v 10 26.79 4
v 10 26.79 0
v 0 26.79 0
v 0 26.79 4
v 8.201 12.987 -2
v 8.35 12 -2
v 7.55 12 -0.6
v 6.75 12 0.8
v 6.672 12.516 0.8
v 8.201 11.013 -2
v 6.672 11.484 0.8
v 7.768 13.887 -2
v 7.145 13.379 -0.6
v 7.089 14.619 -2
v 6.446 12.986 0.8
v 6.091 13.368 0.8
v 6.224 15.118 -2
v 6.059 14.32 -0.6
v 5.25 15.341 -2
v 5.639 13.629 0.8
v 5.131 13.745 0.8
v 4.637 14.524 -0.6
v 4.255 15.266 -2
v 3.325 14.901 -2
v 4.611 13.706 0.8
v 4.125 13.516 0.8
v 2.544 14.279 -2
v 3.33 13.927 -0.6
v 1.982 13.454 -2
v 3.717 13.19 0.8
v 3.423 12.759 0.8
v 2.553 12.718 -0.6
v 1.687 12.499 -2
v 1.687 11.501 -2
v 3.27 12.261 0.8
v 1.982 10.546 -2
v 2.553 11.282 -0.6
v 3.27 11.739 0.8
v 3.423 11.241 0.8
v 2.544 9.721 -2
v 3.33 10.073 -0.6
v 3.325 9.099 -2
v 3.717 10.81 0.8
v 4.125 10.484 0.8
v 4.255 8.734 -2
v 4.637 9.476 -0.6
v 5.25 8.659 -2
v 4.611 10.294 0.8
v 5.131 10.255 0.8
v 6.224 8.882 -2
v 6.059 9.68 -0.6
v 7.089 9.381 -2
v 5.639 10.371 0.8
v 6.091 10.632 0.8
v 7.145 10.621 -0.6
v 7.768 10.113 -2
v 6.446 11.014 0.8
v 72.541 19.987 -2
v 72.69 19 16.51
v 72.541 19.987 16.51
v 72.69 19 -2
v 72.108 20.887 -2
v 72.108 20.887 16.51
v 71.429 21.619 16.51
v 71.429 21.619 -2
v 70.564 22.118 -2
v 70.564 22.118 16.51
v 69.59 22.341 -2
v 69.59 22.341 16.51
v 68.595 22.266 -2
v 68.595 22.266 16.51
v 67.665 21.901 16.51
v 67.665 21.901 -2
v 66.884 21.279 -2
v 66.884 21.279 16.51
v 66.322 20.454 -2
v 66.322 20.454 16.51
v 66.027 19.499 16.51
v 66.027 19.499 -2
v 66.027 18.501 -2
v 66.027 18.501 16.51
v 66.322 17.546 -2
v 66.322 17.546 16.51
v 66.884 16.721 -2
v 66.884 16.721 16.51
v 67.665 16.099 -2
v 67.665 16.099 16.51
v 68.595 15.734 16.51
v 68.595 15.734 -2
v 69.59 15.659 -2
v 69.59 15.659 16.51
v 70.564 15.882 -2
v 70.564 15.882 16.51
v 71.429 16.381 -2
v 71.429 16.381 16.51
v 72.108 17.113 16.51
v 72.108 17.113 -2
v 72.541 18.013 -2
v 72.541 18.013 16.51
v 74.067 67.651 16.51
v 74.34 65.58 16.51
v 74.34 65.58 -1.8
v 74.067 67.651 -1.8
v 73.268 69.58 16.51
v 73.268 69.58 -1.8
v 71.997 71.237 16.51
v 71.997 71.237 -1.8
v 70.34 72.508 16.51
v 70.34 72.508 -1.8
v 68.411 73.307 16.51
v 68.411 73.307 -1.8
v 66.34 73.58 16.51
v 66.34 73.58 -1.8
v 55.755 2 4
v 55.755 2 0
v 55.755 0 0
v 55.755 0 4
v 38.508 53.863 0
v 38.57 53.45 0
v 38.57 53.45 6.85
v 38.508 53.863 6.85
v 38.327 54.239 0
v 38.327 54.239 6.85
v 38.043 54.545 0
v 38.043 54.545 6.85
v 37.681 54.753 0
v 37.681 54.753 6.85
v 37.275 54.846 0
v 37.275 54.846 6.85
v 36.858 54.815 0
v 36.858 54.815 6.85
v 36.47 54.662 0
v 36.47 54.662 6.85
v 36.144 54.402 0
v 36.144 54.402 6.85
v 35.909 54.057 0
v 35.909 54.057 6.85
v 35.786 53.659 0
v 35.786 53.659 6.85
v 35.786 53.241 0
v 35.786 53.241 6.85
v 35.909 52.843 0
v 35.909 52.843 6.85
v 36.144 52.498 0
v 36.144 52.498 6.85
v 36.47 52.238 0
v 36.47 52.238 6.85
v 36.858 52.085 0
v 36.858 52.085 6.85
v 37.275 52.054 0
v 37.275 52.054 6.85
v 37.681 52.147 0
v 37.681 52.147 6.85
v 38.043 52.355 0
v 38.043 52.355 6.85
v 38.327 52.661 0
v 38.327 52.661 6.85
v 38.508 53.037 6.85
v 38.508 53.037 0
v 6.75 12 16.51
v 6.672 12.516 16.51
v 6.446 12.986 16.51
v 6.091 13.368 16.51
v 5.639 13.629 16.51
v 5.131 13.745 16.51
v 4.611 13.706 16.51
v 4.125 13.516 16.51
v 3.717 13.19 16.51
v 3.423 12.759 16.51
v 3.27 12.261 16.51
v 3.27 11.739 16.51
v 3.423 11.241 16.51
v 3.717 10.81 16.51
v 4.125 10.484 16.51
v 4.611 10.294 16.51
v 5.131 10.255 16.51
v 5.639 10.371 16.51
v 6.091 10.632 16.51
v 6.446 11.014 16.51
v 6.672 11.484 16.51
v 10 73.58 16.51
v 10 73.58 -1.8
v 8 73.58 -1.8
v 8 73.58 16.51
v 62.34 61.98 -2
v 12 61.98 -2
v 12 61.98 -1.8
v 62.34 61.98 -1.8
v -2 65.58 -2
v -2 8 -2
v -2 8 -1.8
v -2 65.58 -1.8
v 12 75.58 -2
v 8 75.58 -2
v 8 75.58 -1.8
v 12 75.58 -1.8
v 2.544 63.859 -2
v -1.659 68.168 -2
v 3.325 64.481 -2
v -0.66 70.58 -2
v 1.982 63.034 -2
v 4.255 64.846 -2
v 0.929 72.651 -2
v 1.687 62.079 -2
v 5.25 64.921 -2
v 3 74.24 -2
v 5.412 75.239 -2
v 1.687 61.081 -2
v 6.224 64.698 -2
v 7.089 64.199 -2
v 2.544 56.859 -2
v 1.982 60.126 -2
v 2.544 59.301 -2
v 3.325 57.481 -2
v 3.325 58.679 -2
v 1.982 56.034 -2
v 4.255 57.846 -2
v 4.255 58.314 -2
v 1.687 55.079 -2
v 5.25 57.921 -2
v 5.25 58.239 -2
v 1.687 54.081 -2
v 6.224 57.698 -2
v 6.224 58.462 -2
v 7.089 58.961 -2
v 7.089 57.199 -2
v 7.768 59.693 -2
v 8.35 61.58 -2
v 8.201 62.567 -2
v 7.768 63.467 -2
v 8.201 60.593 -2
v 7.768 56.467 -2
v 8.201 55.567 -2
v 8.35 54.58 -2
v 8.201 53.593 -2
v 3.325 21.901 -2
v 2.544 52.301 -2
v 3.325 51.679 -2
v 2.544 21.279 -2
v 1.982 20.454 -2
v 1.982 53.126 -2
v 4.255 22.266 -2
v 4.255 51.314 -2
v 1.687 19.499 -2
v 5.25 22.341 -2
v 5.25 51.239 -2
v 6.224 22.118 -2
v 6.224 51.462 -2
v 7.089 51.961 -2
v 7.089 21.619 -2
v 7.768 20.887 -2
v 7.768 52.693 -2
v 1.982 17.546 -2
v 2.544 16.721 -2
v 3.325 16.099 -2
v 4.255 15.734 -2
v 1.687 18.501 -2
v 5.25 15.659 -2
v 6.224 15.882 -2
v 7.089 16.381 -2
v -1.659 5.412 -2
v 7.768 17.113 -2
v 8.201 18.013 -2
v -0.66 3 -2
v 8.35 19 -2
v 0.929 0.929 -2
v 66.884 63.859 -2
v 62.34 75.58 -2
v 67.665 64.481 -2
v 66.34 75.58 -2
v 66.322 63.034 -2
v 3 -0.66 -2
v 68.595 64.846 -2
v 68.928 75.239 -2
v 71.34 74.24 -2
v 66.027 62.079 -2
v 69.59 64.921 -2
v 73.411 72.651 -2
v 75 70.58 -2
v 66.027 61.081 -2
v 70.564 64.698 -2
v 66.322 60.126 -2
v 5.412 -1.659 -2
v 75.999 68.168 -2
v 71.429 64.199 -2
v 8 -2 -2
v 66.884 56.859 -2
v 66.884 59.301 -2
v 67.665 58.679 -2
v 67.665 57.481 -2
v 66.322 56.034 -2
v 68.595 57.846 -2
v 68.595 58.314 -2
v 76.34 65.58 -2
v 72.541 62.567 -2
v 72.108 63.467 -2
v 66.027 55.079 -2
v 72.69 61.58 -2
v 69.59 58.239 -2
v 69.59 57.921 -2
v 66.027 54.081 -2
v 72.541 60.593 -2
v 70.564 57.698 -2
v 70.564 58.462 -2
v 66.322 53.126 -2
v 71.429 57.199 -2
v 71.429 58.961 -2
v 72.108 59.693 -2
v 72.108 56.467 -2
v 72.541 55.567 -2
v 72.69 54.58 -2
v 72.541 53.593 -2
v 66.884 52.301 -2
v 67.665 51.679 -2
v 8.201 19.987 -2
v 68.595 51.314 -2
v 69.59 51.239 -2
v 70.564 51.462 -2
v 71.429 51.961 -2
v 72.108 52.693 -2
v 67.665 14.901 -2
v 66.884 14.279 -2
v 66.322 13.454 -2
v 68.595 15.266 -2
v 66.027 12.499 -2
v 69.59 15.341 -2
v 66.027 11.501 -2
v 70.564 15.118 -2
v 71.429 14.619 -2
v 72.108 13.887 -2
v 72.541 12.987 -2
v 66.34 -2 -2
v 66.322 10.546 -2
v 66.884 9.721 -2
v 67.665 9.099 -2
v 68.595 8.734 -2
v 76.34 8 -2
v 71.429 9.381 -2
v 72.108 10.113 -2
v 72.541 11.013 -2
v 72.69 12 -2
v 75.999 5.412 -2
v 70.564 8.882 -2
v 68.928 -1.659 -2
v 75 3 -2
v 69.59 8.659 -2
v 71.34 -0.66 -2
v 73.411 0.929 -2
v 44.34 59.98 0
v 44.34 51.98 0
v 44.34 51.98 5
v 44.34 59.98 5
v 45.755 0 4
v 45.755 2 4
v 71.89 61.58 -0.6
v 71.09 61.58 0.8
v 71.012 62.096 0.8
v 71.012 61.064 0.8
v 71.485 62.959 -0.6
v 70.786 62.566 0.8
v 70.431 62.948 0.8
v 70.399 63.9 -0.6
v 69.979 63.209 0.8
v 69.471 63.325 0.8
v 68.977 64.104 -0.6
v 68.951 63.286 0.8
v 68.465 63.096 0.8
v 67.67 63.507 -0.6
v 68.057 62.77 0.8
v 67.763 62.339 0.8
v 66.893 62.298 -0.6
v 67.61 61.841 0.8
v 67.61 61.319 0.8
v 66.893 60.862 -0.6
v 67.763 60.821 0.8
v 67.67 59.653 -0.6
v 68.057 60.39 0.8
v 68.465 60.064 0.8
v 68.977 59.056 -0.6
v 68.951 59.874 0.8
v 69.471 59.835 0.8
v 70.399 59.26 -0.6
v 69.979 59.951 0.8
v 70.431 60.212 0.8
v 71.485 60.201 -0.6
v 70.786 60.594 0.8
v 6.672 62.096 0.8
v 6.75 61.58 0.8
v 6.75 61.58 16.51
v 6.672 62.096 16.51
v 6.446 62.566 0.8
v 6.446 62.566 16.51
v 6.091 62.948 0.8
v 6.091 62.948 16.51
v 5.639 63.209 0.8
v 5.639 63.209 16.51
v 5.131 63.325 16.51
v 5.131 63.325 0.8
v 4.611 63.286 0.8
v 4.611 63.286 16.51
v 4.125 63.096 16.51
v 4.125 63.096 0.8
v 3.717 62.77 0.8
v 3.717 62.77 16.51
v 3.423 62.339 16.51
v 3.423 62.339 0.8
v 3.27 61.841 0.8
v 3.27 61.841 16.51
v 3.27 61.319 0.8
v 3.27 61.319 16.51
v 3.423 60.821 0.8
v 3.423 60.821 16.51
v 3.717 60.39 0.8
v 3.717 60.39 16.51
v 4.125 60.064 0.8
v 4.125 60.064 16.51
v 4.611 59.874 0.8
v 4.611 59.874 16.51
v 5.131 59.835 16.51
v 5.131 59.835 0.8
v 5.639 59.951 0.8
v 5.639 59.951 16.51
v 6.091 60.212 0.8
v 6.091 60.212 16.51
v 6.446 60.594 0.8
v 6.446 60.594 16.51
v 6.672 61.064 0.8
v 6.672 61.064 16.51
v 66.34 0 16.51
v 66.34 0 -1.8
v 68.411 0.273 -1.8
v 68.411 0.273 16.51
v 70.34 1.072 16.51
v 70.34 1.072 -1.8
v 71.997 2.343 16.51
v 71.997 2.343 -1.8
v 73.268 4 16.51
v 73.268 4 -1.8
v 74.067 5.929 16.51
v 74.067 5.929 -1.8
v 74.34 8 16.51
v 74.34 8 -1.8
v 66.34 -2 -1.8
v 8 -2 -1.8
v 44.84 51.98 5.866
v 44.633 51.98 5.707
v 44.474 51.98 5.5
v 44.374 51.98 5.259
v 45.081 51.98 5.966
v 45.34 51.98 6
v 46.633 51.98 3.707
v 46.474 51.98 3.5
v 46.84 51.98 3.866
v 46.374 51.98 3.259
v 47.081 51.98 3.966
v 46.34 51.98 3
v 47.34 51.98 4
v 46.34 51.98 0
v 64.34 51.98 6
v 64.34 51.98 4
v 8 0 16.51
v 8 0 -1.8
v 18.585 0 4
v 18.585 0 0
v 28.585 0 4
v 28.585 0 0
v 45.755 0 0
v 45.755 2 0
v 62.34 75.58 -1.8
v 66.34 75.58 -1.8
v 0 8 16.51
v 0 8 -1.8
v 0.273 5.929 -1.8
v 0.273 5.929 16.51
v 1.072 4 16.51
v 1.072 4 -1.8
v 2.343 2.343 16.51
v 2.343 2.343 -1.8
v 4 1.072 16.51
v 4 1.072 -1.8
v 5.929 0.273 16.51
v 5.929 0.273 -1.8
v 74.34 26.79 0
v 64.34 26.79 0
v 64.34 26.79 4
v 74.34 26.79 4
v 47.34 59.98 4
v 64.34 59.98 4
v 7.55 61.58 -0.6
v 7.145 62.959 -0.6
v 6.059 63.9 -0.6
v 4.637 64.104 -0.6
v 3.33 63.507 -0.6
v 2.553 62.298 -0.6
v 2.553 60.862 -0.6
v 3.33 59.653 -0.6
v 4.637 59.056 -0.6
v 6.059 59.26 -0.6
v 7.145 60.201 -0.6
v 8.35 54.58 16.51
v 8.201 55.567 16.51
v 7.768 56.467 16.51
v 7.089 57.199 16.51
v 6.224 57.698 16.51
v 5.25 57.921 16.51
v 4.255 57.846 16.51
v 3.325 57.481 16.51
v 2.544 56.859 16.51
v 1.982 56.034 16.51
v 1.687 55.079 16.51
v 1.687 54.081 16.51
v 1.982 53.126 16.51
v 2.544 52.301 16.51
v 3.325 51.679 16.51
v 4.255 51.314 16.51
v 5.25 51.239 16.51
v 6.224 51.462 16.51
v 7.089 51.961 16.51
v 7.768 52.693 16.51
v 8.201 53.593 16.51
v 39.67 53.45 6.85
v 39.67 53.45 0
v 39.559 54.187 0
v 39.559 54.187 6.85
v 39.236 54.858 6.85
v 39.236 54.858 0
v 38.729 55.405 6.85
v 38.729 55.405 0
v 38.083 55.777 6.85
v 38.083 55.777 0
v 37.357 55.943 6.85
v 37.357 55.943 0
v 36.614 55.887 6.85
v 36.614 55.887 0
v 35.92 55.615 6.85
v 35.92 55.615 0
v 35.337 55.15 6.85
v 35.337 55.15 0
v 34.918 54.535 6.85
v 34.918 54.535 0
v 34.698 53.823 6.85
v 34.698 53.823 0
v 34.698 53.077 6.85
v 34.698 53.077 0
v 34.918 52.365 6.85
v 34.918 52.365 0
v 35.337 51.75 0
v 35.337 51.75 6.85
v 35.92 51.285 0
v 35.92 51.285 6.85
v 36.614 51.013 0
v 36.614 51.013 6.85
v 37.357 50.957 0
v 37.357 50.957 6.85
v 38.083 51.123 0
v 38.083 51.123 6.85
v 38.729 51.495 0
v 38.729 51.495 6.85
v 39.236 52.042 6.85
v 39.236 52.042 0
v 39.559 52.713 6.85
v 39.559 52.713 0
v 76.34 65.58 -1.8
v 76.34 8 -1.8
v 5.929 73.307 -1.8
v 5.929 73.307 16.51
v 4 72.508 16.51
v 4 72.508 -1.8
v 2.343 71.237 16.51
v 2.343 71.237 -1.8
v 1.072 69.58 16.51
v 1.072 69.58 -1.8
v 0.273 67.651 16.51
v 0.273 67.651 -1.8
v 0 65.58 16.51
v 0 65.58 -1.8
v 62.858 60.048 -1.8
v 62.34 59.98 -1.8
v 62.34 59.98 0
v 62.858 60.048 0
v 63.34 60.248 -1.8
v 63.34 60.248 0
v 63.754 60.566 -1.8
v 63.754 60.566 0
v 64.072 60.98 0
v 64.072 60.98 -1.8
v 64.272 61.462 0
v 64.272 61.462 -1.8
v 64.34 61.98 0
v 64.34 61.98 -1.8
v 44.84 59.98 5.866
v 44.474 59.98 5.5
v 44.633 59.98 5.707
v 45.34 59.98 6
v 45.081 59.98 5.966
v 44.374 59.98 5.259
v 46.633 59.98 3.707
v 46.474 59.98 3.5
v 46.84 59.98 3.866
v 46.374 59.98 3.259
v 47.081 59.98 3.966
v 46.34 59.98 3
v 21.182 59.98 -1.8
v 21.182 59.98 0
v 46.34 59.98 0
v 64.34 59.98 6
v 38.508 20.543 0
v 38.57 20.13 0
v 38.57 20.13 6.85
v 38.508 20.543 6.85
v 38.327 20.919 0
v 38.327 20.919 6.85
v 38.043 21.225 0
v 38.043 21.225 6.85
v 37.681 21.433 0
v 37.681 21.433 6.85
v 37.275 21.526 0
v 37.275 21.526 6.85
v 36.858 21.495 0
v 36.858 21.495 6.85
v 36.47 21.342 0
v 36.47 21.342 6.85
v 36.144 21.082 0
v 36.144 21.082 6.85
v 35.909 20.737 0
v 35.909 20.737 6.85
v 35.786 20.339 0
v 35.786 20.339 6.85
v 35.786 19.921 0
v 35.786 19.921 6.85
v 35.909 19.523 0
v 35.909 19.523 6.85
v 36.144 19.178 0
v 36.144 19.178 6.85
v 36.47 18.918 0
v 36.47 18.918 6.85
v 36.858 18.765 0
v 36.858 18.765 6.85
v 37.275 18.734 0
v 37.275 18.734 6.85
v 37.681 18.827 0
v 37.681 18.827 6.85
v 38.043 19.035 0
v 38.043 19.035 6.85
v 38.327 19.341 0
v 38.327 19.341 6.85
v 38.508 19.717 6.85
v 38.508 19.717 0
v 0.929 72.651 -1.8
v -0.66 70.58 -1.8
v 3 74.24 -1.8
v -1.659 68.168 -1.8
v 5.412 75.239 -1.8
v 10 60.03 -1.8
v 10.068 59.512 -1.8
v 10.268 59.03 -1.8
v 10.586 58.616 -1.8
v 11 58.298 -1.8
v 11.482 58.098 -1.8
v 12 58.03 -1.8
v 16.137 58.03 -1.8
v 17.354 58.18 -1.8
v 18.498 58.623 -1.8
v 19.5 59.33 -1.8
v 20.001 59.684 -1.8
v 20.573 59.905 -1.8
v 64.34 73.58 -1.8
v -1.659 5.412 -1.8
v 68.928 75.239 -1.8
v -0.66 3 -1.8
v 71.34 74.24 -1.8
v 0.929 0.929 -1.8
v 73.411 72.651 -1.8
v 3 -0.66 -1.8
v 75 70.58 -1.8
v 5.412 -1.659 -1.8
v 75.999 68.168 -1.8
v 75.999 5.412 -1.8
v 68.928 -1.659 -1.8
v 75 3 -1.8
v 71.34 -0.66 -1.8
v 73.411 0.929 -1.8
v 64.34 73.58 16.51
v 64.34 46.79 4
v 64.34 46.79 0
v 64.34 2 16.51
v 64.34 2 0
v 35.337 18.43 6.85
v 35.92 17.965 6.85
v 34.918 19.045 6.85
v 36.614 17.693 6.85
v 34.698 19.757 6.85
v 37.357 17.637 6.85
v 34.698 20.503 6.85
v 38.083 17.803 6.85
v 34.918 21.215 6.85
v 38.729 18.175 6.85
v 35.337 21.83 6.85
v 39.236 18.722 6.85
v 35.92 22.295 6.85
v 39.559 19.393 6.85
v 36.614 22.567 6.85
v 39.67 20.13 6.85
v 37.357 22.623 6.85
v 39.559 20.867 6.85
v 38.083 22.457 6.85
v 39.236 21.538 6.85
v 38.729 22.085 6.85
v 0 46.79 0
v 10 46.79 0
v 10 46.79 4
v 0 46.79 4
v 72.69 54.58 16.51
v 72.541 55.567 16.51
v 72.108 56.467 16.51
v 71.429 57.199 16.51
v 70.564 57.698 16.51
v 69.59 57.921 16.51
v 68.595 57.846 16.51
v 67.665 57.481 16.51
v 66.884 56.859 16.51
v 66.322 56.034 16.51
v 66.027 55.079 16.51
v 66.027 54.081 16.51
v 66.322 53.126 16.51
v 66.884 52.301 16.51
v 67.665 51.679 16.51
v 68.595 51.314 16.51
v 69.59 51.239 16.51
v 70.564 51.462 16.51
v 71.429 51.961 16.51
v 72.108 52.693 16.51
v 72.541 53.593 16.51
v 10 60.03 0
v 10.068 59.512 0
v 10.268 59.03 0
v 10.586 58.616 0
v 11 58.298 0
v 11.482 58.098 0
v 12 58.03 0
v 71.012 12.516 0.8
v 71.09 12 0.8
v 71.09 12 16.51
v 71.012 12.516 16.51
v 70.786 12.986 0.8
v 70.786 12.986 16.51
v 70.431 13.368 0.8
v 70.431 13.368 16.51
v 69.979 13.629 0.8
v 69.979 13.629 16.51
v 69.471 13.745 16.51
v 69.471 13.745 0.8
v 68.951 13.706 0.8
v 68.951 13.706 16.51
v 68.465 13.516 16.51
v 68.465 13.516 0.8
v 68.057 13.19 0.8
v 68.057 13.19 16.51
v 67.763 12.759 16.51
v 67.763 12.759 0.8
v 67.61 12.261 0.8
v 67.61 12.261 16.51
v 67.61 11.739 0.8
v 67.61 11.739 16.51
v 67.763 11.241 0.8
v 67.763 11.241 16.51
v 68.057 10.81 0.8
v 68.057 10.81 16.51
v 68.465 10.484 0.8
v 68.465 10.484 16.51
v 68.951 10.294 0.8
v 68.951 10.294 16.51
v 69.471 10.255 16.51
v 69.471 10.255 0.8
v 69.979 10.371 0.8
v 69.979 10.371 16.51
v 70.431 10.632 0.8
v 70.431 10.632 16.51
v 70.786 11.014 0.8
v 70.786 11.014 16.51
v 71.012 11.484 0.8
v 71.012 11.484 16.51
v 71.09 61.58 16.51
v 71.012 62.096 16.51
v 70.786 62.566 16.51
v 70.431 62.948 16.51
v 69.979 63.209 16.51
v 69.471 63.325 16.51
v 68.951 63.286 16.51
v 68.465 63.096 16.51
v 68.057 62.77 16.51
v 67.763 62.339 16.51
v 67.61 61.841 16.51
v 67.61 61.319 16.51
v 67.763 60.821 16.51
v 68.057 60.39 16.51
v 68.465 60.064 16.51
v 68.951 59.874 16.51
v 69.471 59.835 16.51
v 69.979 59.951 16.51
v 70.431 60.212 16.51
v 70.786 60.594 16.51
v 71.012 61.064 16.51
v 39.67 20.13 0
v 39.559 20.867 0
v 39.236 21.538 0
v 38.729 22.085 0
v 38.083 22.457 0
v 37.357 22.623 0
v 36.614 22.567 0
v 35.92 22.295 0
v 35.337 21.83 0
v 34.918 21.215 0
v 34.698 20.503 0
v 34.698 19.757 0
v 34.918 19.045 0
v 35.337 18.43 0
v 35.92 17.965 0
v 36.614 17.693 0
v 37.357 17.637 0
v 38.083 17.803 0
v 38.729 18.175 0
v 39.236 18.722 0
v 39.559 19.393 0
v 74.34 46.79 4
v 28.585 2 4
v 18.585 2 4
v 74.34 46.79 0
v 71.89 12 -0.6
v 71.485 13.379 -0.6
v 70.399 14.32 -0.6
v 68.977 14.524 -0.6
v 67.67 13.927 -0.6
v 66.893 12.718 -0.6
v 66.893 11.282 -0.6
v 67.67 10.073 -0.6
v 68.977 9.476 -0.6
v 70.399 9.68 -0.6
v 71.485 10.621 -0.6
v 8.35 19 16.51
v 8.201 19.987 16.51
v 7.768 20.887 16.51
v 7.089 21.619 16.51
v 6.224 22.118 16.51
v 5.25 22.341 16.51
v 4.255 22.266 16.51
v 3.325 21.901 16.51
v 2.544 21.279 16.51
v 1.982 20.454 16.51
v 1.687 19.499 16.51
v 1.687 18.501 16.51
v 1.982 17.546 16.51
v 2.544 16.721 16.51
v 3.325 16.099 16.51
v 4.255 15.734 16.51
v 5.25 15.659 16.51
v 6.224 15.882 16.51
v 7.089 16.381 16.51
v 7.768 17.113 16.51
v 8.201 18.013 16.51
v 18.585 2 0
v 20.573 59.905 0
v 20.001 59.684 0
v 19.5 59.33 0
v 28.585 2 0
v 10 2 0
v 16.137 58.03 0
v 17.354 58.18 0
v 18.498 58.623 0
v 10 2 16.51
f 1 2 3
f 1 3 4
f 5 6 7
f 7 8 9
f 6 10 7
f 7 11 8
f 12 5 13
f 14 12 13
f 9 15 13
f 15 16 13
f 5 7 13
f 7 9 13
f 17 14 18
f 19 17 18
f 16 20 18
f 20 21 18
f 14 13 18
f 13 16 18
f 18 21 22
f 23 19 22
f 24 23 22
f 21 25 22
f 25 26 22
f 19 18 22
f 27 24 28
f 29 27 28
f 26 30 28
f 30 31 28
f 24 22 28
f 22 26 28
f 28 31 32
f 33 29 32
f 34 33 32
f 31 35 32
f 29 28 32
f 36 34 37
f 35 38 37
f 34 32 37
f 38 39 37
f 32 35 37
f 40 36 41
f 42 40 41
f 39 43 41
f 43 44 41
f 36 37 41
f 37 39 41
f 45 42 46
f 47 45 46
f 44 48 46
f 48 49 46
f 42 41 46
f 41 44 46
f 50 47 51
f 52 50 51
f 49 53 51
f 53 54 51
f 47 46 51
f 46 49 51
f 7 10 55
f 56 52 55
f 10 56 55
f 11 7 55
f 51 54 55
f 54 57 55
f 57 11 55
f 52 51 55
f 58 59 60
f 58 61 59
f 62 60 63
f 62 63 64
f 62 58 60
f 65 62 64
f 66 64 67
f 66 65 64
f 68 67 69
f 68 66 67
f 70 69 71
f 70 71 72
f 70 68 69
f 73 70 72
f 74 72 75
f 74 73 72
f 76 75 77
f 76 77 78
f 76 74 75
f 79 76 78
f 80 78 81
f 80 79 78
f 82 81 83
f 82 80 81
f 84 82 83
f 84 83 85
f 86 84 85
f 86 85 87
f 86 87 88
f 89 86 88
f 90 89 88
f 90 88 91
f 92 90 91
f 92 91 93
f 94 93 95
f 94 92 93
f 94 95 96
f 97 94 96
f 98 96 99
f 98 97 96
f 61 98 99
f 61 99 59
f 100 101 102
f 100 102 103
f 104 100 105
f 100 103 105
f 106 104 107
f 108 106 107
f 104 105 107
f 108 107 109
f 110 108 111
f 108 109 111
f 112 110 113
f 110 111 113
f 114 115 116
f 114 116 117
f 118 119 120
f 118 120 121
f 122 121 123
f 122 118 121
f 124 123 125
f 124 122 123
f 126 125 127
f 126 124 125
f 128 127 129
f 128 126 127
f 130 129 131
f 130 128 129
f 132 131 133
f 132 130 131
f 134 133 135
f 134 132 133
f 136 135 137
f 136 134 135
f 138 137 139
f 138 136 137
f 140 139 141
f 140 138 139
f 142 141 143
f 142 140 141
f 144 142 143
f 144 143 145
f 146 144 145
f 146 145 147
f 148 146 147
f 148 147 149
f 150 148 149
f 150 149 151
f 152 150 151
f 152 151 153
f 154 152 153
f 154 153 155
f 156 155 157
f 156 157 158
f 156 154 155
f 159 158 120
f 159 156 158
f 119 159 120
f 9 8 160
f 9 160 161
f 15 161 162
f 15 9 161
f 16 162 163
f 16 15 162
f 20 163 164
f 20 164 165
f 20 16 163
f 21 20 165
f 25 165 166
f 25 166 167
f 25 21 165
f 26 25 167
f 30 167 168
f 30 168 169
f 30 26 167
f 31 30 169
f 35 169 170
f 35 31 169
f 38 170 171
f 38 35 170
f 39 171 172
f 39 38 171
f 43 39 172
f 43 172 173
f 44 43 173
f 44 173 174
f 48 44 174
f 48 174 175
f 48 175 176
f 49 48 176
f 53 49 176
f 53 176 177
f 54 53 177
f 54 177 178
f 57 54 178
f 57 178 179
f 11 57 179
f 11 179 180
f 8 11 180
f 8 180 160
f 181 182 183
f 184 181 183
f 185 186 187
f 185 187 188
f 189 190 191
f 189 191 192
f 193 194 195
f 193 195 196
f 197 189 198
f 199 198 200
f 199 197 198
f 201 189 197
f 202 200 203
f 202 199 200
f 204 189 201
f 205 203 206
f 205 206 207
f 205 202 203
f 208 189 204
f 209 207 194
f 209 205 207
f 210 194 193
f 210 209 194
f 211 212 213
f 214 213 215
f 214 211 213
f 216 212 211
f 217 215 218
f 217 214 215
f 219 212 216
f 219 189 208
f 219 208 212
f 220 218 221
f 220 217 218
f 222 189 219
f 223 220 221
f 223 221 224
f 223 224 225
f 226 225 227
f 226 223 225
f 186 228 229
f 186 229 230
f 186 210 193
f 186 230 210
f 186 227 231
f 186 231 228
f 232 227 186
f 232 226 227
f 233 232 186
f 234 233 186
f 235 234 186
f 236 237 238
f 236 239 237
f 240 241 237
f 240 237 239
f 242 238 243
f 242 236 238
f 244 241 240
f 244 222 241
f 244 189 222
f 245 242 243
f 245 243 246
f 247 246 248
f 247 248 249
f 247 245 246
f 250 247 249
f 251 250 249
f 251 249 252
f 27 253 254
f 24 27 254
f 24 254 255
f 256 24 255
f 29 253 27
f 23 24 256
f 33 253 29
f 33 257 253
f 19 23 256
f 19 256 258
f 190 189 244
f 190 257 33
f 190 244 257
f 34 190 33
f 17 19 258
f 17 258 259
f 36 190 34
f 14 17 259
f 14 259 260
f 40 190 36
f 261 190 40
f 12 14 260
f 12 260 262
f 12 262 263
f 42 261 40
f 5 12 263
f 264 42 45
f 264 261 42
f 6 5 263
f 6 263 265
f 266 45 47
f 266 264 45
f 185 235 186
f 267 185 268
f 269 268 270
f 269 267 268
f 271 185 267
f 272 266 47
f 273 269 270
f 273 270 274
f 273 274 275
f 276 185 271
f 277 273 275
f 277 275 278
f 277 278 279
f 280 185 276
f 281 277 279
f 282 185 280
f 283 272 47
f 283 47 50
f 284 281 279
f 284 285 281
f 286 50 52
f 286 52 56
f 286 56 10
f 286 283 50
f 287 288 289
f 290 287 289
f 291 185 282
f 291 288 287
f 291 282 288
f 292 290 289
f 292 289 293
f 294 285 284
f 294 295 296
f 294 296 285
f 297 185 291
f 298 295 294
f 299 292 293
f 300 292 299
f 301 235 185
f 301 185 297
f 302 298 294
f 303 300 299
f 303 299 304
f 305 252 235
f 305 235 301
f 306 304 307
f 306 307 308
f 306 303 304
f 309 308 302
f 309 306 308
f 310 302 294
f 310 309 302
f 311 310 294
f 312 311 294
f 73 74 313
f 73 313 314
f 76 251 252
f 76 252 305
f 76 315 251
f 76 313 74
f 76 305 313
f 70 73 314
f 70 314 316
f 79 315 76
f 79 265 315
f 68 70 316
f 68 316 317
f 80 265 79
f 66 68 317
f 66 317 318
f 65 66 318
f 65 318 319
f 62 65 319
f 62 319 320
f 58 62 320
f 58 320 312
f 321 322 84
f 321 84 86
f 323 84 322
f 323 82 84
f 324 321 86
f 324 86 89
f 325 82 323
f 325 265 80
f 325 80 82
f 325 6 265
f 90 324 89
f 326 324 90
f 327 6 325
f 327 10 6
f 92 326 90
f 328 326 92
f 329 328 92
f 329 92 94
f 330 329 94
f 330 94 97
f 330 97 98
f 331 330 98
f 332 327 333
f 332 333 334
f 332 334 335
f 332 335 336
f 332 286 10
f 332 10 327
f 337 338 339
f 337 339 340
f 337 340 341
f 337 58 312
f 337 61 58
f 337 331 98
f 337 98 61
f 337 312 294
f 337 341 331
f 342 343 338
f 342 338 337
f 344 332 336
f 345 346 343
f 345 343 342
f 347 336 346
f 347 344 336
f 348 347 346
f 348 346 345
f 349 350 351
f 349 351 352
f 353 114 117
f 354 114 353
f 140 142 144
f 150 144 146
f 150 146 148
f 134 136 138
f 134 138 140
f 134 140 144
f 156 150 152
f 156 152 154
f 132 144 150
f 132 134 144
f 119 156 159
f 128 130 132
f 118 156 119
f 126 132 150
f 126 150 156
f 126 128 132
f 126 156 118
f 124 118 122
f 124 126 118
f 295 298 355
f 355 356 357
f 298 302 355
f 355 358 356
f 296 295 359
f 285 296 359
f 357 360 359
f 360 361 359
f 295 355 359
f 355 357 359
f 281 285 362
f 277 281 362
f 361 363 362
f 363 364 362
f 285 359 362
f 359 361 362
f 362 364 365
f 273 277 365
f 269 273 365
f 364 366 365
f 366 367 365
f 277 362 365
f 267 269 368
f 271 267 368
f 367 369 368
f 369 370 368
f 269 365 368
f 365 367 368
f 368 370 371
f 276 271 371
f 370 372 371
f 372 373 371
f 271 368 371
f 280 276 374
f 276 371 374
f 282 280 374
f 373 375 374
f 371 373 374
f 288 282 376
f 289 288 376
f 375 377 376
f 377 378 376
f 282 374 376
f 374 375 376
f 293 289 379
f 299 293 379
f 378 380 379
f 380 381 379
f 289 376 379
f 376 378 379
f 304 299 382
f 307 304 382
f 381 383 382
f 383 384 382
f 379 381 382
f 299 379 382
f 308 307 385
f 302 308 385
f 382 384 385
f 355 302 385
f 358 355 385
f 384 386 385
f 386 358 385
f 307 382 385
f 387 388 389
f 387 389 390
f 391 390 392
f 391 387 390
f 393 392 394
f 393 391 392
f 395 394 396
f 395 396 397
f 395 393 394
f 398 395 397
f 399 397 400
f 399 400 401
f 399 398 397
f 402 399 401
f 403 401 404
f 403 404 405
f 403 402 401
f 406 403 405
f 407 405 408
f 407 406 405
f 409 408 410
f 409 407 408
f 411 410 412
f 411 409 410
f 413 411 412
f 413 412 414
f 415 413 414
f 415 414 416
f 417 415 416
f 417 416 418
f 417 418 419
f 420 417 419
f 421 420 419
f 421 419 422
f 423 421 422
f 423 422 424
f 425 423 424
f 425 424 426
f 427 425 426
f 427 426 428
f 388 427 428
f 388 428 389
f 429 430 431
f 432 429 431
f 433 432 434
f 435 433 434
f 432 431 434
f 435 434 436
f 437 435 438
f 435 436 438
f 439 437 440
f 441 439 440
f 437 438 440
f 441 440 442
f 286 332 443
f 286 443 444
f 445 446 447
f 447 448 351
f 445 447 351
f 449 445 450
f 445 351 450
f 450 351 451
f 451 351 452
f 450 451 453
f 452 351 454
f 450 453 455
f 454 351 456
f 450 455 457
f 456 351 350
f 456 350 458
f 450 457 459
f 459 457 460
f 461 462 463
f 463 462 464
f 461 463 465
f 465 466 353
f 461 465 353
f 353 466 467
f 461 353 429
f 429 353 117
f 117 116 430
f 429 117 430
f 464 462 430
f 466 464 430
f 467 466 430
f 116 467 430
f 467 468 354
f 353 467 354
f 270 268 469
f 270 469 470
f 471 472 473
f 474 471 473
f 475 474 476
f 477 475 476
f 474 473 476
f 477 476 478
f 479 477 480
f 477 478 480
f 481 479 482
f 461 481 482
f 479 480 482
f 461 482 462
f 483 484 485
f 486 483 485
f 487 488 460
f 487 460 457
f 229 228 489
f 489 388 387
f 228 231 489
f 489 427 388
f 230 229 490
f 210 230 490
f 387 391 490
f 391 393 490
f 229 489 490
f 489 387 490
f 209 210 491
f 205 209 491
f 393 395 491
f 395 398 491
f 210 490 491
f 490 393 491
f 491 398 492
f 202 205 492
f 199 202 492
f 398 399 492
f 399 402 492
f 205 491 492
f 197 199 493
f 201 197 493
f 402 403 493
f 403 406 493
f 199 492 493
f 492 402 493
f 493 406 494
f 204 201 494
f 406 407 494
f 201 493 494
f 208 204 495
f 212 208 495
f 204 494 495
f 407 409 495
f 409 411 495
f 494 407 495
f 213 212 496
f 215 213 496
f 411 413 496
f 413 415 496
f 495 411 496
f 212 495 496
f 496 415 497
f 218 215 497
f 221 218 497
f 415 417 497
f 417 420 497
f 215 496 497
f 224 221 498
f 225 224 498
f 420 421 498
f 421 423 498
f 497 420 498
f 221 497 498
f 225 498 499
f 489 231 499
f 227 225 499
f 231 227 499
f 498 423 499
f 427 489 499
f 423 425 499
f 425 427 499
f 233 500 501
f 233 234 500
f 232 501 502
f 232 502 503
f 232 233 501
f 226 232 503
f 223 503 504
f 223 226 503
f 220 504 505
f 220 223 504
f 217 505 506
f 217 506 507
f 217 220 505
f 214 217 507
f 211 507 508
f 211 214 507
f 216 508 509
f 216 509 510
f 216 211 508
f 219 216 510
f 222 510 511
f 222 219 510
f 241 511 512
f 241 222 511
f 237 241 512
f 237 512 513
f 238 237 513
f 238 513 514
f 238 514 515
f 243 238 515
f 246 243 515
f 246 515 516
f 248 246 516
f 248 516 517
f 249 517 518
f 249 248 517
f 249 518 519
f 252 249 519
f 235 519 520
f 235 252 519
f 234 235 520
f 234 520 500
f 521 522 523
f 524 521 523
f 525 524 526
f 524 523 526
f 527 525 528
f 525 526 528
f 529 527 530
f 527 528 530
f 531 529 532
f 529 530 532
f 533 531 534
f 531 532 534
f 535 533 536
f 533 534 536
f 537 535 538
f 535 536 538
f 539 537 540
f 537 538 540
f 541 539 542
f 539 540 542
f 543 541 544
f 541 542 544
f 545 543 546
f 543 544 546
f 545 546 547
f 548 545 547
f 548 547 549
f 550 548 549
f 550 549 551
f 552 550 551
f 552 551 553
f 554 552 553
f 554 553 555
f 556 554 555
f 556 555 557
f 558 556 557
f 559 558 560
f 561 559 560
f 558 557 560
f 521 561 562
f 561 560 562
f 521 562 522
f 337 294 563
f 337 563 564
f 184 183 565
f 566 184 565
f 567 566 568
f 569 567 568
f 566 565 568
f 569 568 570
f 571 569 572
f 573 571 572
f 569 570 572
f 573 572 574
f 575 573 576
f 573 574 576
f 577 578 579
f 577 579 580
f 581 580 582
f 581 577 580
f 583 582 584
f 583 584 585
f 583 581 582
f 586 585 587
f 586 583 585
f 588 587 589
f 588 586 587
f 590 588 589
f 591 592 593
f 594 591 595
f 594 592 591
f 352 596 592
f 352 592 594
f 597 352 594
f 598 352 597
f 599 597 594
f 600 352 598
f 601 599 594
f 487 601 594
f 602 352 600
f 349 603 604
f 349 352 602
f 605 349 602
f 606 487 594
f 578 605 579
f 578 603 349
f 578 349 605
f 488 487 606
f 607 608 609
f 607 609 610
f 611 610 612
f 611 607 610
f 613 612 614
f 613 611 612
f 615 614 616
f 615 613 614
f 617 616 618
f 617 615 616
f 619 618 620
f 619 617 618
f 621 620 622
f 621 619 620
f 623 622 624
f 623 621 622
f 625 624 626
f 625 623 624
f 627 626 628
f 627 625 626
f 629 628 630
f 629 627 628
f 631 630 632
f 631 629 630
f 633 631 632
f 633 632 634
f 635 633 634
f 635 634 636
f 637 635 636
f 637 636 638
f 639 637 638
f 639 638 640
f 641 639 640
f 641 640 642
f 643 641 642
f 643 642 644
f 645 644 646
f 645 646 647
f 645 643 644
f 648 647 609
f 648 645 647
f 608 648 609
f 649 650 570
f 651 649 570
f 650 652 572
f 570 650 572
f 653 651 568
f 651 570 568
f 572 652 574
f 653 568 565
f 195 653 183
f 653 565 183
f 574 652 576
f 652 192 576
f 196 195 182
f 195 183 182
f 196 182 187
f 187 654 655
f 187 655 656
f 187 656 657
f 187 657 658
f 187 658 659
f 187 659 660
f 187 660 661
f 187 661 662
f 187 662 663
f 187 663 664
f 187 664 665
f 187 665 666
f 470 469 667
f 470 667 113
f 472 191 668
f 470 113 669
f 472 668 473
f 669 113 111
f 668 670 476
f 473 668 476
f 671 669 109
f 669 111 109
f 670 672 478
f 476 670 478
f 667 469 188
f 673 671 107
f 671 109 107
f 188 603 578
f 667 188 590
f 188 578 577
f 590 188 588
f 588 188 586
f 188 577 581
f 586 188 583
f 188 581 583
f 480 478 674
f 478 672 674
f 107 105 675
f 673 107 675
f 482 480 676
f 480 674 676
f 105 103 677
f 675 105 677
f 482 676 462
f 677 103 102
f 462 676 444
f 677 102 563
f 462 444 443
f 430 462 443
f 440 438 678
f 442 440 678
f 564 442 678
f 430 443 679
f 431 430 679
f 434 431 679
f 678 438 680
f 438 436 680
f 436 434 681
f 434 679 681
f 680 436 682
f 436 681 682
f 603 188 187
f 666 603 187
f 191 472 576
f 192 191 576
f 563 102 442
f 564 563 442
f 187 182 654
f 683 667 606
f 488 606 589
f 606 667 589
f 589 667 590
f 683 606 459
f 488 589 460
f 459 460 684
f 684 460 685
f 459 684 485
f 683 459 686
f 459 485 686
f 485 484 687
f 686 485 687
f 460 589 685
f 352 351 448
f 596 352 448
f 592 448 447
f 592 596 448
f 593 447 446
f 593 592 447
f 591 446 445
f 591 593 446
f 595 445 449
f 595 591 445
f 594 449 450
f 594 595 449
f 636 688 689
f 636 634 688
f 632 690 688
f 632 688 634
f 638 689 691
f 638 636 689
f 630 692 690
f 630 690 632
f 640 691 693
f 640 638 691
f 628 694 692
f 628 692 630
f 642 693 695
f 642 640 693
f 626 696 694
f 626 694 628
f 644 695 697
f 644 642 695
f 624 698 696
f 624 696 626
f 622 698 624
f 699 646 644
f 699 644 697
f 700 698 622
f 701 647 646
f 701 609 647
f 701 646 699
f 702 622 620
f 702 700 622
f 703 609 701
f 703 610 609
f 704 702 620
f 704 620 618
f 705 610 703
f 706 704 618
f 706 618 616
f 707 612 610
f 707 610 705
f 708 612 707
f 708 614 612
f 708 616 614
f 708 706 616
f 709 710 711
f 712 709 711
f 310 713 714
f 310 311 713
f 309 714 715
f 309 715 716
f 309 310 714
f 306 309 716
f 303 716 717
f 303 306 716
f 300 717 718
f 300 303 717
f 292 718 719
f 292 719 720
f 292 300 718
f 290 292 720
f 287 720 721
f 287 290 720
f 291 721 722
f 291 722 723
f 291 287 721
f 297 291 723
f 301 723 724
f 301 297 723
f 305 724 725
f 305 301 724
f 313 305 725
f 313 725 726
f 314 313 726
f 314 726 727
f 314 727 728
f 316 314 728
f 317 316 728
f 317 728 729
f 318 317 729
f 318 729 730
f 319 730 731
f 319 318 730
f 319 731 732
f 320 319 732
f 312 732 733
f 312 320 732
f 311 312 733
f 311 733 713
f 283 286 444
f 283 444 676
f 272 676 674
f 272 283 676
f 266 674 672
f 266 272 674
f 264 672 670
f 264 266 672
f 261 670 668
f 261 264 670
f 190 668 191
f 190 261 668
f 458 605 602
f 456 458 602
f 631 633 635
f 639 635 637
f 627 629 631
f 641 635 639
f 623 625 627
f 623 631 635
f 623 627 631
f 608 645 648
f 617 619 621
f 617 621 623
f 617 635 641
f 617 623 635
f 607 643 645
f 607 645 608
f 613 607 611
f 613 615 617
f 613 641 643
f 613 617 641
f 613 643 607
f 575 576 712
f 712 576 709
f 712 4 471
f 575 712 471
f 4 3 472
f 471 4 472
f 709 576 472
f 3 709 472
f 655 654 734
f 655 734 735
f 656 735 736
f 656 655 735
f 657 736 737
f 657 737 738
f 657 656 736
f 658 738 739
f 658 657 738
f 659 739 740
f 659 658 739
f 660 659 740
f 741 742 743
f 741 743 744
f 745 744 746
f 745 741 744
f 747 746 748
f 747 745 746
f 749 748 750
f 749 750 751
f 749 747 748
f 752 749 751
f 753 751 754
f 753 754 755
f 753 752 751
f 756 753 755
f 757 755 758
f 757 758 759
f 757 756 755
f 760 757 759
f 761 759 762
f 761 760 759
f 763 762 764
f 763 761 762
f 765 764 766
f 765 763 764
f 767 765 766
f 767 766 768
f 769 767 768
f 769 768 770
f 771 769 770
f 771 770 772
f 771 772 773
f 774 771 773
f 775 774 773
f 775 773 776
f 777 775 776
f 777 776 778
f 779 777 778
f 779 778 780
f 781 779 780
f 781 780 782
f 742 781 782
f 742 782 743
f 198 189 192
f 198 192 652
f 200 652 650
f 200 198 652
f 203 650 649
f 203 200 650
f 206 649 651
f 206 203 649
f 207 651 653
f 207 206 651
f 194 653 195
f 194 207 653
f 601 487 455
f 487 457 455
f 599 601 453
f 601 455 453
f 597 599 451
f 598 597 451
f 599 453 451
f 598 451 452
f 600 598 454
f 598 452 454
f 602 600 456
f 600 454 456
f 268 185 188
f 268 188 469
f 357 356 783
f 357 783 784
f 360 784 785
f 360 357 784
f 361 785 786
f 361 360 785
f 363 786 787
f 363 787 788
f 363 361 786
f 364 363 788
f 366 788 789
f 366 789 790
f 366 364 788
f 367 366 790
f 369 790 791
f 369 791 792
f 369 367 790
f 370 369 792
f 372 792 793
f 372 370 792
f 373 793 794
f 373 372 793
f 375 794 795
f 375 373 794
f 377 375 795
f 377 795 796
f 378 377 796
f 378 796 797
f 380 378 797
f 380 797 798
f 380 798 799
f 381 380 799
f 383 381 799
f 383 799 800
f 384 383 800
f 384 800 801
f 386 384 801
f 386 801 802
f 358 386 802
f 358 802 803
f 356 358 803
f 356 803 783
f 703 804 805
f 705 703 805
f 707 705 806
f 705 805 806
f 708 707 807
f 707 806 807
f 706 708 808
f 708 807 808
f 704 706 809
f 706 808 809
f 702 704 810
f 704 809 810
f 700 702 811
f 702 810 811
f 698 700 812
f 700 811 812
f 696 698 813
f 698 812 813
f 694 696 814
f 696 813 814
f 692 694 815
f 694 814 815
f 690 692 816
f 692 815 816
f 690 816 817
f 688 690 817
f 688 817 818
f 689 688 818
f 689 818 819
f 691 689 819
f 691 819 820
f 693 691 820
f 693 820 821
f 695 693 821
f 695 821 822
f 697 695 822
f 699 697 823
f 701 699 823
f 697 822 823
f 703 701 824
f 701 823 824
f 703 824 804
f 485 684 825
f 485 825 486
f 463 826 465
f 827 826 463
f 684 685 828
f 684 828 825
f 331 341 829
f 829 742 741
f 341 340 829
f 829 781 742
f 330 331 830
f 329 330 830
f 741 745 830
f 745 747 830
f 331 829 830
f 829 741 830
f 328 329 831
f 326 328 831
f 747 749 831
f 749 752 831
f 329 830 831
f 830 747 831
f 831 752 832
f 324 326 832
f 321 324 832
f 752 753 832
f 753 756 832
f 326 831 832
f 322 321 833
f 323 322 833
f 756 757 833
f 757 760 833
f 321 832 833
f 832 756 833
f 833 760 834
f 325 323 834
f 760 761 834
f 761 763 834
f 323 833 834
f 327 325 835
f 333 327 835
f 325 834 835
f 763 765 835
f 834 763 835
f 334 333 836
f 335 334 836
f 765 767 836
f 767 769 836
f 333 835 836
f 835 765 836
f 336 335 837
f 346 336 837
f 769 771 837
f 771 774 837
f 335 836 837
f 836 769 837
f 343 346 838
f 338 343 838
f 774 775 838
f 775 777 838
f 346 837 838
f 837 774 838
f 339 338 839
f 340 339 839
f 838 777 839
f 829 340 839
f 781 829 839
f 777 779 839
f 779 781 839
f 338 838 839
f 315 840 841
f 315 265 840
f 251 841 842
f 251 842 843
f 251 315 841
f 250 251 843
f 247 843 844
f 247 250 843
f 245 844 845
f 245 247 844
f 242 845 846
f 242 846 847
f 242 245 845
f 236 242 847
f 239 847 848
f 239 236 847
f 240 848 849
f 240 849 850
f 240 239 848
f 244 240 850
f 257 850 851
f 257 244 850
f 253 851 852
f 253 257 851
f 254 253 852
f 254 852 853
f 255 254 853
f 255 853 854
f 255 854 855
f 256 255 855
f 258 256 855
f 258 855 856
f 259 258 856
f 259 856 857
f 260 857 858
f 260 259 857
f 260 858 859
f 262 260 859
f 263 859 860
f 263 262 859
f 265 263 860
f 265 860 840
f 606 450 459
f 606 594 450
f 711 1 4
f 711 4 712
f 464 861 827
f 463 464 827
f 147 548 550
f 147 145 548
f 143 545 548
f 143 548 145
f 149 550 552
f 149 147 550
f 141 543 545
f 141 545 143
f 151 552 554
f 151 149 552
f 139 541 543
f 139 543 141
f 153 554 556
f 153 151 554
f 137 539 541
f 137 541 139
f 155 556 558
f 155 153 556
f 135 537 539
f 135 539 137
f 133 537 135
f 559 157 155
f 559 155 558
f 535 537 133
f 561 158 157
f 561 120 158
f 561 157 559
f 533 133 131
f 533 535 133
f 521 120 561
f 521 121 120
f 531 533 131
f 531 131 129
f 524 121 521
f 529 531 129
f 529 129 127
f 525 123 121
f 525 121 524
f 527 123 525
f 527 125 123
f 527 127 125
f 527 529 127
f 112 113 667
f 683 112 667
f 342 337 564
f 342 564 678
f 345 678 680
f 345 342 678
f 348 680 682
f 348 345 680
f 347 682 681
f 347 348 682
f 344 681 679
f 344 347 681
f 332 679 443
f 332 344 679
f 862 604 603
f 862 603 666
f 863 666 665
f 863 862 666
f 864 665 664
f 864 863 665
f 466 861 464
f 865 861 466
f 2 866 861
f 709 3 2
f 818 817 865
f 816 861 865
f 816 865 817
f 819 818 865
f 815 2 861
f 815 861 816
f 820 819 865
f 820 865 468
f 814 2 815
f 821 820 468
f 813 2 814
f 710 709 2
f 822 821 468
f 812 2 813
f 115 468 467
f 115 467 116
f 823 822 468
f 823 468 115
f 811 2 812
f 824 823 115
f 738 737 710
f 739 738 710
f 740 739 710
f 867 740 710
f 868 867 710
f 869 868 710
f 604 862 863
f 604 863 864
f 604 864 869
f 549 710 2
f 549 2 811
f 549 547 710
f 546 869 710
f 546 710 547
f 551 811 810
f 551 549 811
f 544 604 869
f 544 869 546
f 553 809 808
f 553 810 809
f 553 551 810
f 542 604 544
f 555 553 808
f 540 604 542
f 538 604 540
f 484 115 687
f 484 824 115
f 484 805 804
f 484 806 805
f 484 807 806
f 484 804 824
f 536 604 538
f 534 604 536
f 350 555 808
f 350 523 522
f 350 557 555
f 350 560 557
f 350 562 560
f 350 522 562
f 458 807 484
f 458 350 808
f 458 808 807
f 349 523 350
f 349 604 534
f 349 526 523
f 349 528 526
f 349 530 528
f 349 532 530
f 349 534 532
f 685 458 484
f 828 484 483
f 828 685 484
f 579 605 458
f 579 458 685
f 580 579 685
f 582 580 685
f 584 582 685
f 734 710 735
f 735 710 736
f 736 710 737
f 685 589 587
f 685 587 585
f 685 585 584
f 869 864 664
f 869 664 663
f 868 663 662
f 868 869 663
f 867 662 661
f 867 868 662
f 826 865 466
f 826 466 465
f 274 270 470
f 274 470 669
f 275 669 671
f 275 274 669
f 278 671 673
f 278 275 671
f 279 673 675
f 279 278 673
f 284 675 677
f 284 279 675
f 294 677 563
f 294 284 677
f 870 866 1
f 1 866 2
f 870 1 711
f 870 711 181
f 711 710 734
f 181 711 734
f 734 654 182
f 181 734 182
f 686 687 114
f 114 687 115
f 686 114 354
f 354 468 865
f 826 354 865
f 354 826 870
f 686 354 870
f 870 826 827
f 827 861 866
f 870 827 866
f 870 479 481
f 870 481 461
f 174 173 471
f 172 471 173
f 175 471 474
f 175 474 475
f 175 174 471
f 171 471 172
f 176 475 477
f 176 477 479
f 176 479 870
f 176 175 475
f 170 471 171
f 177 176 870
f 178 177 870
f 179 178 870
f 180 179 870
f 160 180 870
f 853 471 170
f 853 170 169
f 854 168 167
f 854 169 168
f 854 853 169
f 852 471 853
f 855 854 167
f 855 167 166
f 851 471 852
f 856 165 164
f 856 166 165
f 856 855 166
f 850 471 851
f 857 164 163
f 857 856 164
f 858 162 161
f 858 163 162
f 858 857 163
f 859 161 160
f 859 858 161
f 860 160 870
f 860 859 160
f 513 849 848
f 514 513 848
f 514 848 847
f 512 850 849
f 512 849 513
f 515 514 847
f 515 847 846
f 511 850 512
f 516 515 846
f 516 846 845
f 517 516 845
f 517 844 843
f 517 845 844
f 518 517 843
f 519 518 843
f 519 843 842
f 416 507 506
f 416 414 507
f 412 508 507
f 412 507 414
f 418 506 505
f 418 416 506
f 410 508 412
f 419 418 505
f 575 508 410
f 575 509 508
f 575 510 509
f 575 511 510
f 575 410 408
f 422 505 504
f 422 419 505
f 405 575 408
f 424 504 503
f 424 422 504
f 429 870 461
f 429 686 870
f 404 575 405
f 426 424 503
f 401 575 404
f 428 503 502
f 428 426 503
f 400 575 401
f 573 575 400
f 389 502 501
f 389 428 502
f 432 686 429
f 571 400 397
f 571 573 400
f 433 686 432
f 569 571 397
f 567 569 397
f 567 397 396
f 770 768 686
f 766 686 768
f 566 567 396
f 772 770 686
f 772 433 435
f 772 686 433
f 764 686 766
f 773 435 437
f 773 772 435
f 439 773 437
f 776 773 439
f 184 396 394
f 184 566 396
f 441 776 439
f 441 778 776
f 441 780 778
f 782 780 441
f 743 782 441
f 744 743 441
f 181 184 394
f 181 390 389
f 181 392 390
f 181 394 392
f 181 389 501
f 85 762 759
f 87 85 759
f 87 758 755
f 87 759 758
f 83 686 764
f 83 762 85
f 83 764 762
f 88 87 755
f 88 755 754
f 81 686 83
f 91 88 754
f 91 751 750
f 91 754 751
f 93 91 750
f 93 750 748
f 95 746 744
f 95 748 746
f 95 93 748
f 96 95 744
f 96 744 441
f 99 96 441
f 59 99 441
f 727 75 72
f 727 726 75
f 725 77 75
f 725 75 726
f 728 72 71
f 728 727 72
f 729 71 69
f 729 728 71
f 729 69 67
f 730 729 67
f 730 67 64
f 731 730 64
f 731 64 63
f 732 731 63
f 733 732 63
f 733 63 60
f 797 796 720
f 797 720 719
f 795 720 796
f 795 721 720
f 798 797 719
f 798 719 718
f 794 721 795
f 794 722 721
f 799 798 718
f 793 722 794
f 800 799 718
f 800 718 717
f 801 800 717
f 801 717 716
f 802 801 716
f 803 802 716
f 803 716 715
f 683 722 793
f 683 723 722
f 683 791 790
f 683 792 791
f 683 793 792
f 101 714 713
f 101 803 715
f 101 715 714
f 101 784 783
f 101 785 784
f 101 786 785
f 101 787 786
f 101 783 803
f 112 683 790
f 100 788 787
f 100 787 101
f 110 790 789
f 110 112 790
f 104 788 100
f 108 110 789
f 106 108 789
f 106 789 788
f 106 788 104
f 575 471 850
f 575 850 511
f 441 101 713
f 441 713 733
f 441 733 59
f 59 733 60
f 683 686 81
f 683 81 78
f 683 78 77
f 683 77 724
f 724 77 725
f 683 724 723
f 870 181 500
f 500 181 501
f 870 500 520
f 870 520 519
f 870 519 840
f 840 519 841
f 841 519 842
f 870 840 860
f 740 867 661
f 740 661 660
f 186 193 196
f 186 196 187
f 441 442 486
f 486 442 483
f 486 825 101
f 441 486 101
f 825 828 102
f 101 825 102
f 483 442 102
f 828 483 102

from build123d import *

# Parameters (mm, degrees)
F1_R      = 1.75
F1_R_2    = 3.35
F2_DEPTH  = 2
F3_R      = 2
F4_R      = 1.75
F4_R_2    = 3.35
F5_DEPTH  = 16.51
F6_SIZE2  = 2.8
F6_SIZE   = 1.6
F7_R      = 2.5
F7_R_2    = 1.4
F8_DEPTH  = 6.85
F9_W      = 20
F9_H      = 4
F10_DEPTH = 10.001
F11_W     = 20
F11_H     = 4
F12_DEPTH = 10.001
F13_W     = 10
F13_H     = 4
F14_DEPTH = 2.001
F15_W     = 20
F15_H     = 8
F16_DEPTH = 6
F17_W     = 18
F17_H     = 4
F18_DEPTH = 8
F19_R     = 1
F21_DEPTH = 0.2


with BuildPart() as f2:
    # F1 (on Top) → F2 (new body)
    with BuildSketch(Plane.XY):
        with BuildLine():
            ThreePointArc((8, 73.58), (2.343146, 71.236854), (0, 65.58))
            Line((0, 65.58), (0, 8))
            ThreePointArc((0, 8), (2.343146, 2.343146), (8, 0))
            Line((8, 0), (66.34, 0))
            ThreePointArc((66.34, 0), (71.996854, 2.343146), (74.34, 8))
            Line((74.34, 8), (74.34, 65.58))
            ThreePointArc((74.34, 65.58), (71.996854, 71.236854), (66.34, 73.58))
            Line((66.34, 73.58), (64.34, 73.58))
            Line((64.34, 73.58), (64.34, 59.98))
            Line((64.34, 59.98), (21.181552, 59.98))
            ThreePointArc((21.181552, 59.98), (20.280164, 59.811845), (19.500034, 59.33))
            ThreePointArc((19.500034, 59.33), (17.939776, 58.36631), (16.137, 58.03))
            Line((16.137, 58.03), (10, 58.03))
            Line((10, 58.03), (10, 73.58))
            Line((10, 73.58), (8, 73.58))
        make_face()
        with Locations((5, 12)):
            Circle(F1_R, mode=Mode.SUBTRACT)
        with Locations((5, 19)):
            Circle(F1_R_2, mode=Mode.SUBTRACT)
        with Locations((69.34, 12)):
            Circle(F1_R, mode=Mode.SUBTRACT)
        with Locations((69.34, 19)):
            Circle(F1_R_2, mode=Mode.SUBTRACT)
        with Locations((5, 54.58)):
            Circle(F1_R_2, mode=Mode.SUBTRACT)
        with Locations((5, 61.58)):
            Circle(F1_R, mode=Mode.SUBTRACT)
        with Locations((69.34, 54.58)):
            Circle(F1_R_2, mode=Mode.SUBTRACT)
        with Locations((69.34, 61.58)):
            Circle(F1_R, mode=Mode.SUBTRACT)
    extrude(amount=-F2_DEPTH)

    # F3
    f3_edges = [f2.edges().sort_by_distance(p)[0] for p in [
        (10, 58.03, -1),
        (64.34, 59.98, -1),
    ]]
    fillet(f3_edges, radius=F3_R)

    # F4 (on face) → F5 (join)
    with BuildSketch(Plane.XY):
        with BuildLine():
            ThreePointArc((8, 73.58), (2.343146, 71.236854), (0, 65.58))
            Line((0, 65.58), (0, 8))
            ThreePointArc((0, 8), (2.343146, 2.343146), (8, 0))
            Line((8, 0), (66.34, 0))
            ThreePointArc((66.34, 0), (71.996854, 2.343146), (74.34, 8))
            Line((74.34, 8), (74.34, 65.58))
            ThreePointArc((74.34, 65.58), (71.996854, 71.236854), (66.34, 73.58))
            Line((66.34, 73.58), (64.34, 73.58))
            Line((64.34, 73.58), (64.34, 2))
            Line((64.34, 2), (10, 2))
            Line((10, 2), (10, 73.58))
            Line((10, 73.58), (8, 73.58))
        make_face()
        with Locations((5, 12)):
            Circle(F4_R, mode=Mode.SUBTRACT)
        with Locations((5, 19)):
            Circle(F4_R_2, mode=Mode.SUBTRACT)
        with Locations((69.34, 12)):
            Circle(F4_R, mode=Mode.SUBTRACT)
        with Locations((69.34, 19)):
            Circle(F4_R_2, mode=Mode.SUBTRACT)
        with Locations((5, 54.58)):
            Circle(F4_R_2, mode=Mode.SUBTRACT)
        with Locations((5, 61.58)):
            Circle(F4_R, mode=Mode.SUBTRACT)
        with Locations((69.34, 54.58)):
            Circle(F4_R_2, mode=Mode.SUBTRACT)
        with Locations((69.34, 61.58)):
            Circle(F4_R, mode=Mode.SUBTRACT)
    extrude(amount=F5_DEPTH)

    # F6
    f6_edges = [f2.edges().sort_by_distance(p)[0] for p in [
        (3.25, 61.58, -2),
        (3.25, 12, -2),
        (67.59, 12, -2),
        (67.59, 61.58, -2),
    ]]
    chamfer(f6_edges, length=F6_SIZE, length2=F6_SIZE2)

    # F7 (on face) → F8 (join)
    with BuildSketch(Plane.XY):
        with Locations((37.17, 53.45)):
            Circle(F7_R)
        with Locations((37.17, 53.45)):
            Circle(F7_R_2, mode=Mode.SUBTRACT)
        with Locations((37.17, 20.13)):
            Circle(F7_R)
        with Locations((37.17, 20.13)):
            Circle(F7_R_2, mode=Mode.SUBTRACT)
    extrude(amount=F8_DEPTH)

    # F9 (on face) → F10 (cut, through all)
    with BuildSketch(Plane.YZ.offset(10)):
        with Locations((36.79, 2)):
            Rectangle(F9_W, F9_H)
    extrude(amount=-F10_DEPTH, mode=Mode.SUBTRACT)

    # F11 (on face) → F12 (cut, through all)
    with BuildSketch(Plane(origin=(64.34, 0, 0), x_dir=(0, -1, 0), z_dir=(-1, 0, 0))):
        with Locations((-36.79, 2)):
            Rectangle(F11_W, F11_H)
    extrude(amount=-F12_DEPTH, mode=Mode.SUBTRACT)

    # F13 (on face) → F14 (cut, through all)
    with BuildSketch(Plane(origin=(0, 2, 0), x_dir=(-1, 0, 0), z_dir=(0, 1, 0))):
        with Locations((-50.755, 2)):
            Rectangle(F13_W, F13_H)
        with Locations((-23.585, 2)):
            Rectangle(F13_W, F13_H)
    extrude(amount=-F14_DEPTH, mode=Mode.SUBTRACT)

    # F15 (on face) → F16 (join)
    with BuildSketch(Plane.XY):
        with Locations((54.34, 55.98)):
            Rectangle(F15_W, F15_H)
    extrude(amount=F16_DEPTH)

    # F17 (on face) → F18 (cut, through all)
    with BuildSketch(Plane(origin=(0, 59.98, 0), x_dir=(-1, 0, 0), z_dir=(0, 1, 0))):
        with Locations((-55.34, 2)):
            Rectangle(F17_W, F17_H)
    extrude(amount=-F18_DEPTH, mode=Mode.SUBTRACT)

    # F19
    f19_edges = [f2.edges().sort_by_distance(p)[0] for p in [
        (46.34, 55.98, 4),
        (44.34, 55.98, 6),
    ]]
    fillet(f19_edges, radius=F19_R)

    # F20 (on face) → F21 (join)
    with BuildSketch(Plane(origin=(0, 0, -2), x_dir=(1, 0, 0), z_dir=(0, 0, -1))):
        with BuildLine():
            ThreePointArc((8, 2), (0.928932, -0.928932), (-2, -8))
            Line((-2, -8), (-2, -65.58))
            ThreePointArc((-2, -65.58), (0.928932, -72.651068), (8, -75.58))
            Line((8, -75.58), (12, -75.58))
            Line((12, -75.58), (12, -61.98))
            Line((12, -61.98), (62.34, -61.98))
            Line((62.34, -61.98), (62.34, -75.58))
            Line((62.34, -75.58), (66.34, -75.58))
            ThreePointArc((66.34, -75.58), (73.411068, -72.651068), (76.34, -65.58))
            Line((76.34, -65.58), (76.34, -8))
            ThreePointArc((76.34, -8), (73.411068, -0.928932), (66.34, 2))
            Line((66.34, 2), (8, 2))
        make_face()
        with BuildLine():
            Line((0, -65.58), (0, -8))
            ThreePointArc((0, -8), (2.343146, -2.343146), (8, 0))
            Line((8, 0), (66.34, 0))
            ThreePointArc((66.34, 0), (71.996854, -2.343146), (74.34, -8))
            Line((74.34, -8), (74.34, -65.58))
            ThreePointArc((74.34, -65.58), (71.996854, -71.236854), (66.34, -73.58))
            Line((66.34, -73.58), (64.34, -73.58))
            Line((64.34, -73.58), (64.34, -61.98))
            ThreePointArc((64.34, -61.98), (63.754214, -60.565786), (62.34, -59.98))
            Line((62.34, -59.98), (21.181552, -59.98))
            ThreePointArc((21.181552, -59.98), (20.280164, -59.811845), (19.500034, -59.33))
            ThreePointArc((19.500034, -59.33), (17.939776, -58.36631), (16.137, -58.03))
            Line((16.137, -58.03), (12, -58.03))
            ThreePointArc((12, -58.03), (10.585786, -58.615786), (10, -60.03))
            Line((10, -60.03), (10, -73.58))
            Line((10, -73.58), (8, -73.58))
            ThreePointArc((8, -73.58), (2.343146, -71.236854), (0, -65.58))
        make_face(mode=Mode.SUBTRACT)
    extrude(amount=-F21_DEPTH)


solid = f2.part
